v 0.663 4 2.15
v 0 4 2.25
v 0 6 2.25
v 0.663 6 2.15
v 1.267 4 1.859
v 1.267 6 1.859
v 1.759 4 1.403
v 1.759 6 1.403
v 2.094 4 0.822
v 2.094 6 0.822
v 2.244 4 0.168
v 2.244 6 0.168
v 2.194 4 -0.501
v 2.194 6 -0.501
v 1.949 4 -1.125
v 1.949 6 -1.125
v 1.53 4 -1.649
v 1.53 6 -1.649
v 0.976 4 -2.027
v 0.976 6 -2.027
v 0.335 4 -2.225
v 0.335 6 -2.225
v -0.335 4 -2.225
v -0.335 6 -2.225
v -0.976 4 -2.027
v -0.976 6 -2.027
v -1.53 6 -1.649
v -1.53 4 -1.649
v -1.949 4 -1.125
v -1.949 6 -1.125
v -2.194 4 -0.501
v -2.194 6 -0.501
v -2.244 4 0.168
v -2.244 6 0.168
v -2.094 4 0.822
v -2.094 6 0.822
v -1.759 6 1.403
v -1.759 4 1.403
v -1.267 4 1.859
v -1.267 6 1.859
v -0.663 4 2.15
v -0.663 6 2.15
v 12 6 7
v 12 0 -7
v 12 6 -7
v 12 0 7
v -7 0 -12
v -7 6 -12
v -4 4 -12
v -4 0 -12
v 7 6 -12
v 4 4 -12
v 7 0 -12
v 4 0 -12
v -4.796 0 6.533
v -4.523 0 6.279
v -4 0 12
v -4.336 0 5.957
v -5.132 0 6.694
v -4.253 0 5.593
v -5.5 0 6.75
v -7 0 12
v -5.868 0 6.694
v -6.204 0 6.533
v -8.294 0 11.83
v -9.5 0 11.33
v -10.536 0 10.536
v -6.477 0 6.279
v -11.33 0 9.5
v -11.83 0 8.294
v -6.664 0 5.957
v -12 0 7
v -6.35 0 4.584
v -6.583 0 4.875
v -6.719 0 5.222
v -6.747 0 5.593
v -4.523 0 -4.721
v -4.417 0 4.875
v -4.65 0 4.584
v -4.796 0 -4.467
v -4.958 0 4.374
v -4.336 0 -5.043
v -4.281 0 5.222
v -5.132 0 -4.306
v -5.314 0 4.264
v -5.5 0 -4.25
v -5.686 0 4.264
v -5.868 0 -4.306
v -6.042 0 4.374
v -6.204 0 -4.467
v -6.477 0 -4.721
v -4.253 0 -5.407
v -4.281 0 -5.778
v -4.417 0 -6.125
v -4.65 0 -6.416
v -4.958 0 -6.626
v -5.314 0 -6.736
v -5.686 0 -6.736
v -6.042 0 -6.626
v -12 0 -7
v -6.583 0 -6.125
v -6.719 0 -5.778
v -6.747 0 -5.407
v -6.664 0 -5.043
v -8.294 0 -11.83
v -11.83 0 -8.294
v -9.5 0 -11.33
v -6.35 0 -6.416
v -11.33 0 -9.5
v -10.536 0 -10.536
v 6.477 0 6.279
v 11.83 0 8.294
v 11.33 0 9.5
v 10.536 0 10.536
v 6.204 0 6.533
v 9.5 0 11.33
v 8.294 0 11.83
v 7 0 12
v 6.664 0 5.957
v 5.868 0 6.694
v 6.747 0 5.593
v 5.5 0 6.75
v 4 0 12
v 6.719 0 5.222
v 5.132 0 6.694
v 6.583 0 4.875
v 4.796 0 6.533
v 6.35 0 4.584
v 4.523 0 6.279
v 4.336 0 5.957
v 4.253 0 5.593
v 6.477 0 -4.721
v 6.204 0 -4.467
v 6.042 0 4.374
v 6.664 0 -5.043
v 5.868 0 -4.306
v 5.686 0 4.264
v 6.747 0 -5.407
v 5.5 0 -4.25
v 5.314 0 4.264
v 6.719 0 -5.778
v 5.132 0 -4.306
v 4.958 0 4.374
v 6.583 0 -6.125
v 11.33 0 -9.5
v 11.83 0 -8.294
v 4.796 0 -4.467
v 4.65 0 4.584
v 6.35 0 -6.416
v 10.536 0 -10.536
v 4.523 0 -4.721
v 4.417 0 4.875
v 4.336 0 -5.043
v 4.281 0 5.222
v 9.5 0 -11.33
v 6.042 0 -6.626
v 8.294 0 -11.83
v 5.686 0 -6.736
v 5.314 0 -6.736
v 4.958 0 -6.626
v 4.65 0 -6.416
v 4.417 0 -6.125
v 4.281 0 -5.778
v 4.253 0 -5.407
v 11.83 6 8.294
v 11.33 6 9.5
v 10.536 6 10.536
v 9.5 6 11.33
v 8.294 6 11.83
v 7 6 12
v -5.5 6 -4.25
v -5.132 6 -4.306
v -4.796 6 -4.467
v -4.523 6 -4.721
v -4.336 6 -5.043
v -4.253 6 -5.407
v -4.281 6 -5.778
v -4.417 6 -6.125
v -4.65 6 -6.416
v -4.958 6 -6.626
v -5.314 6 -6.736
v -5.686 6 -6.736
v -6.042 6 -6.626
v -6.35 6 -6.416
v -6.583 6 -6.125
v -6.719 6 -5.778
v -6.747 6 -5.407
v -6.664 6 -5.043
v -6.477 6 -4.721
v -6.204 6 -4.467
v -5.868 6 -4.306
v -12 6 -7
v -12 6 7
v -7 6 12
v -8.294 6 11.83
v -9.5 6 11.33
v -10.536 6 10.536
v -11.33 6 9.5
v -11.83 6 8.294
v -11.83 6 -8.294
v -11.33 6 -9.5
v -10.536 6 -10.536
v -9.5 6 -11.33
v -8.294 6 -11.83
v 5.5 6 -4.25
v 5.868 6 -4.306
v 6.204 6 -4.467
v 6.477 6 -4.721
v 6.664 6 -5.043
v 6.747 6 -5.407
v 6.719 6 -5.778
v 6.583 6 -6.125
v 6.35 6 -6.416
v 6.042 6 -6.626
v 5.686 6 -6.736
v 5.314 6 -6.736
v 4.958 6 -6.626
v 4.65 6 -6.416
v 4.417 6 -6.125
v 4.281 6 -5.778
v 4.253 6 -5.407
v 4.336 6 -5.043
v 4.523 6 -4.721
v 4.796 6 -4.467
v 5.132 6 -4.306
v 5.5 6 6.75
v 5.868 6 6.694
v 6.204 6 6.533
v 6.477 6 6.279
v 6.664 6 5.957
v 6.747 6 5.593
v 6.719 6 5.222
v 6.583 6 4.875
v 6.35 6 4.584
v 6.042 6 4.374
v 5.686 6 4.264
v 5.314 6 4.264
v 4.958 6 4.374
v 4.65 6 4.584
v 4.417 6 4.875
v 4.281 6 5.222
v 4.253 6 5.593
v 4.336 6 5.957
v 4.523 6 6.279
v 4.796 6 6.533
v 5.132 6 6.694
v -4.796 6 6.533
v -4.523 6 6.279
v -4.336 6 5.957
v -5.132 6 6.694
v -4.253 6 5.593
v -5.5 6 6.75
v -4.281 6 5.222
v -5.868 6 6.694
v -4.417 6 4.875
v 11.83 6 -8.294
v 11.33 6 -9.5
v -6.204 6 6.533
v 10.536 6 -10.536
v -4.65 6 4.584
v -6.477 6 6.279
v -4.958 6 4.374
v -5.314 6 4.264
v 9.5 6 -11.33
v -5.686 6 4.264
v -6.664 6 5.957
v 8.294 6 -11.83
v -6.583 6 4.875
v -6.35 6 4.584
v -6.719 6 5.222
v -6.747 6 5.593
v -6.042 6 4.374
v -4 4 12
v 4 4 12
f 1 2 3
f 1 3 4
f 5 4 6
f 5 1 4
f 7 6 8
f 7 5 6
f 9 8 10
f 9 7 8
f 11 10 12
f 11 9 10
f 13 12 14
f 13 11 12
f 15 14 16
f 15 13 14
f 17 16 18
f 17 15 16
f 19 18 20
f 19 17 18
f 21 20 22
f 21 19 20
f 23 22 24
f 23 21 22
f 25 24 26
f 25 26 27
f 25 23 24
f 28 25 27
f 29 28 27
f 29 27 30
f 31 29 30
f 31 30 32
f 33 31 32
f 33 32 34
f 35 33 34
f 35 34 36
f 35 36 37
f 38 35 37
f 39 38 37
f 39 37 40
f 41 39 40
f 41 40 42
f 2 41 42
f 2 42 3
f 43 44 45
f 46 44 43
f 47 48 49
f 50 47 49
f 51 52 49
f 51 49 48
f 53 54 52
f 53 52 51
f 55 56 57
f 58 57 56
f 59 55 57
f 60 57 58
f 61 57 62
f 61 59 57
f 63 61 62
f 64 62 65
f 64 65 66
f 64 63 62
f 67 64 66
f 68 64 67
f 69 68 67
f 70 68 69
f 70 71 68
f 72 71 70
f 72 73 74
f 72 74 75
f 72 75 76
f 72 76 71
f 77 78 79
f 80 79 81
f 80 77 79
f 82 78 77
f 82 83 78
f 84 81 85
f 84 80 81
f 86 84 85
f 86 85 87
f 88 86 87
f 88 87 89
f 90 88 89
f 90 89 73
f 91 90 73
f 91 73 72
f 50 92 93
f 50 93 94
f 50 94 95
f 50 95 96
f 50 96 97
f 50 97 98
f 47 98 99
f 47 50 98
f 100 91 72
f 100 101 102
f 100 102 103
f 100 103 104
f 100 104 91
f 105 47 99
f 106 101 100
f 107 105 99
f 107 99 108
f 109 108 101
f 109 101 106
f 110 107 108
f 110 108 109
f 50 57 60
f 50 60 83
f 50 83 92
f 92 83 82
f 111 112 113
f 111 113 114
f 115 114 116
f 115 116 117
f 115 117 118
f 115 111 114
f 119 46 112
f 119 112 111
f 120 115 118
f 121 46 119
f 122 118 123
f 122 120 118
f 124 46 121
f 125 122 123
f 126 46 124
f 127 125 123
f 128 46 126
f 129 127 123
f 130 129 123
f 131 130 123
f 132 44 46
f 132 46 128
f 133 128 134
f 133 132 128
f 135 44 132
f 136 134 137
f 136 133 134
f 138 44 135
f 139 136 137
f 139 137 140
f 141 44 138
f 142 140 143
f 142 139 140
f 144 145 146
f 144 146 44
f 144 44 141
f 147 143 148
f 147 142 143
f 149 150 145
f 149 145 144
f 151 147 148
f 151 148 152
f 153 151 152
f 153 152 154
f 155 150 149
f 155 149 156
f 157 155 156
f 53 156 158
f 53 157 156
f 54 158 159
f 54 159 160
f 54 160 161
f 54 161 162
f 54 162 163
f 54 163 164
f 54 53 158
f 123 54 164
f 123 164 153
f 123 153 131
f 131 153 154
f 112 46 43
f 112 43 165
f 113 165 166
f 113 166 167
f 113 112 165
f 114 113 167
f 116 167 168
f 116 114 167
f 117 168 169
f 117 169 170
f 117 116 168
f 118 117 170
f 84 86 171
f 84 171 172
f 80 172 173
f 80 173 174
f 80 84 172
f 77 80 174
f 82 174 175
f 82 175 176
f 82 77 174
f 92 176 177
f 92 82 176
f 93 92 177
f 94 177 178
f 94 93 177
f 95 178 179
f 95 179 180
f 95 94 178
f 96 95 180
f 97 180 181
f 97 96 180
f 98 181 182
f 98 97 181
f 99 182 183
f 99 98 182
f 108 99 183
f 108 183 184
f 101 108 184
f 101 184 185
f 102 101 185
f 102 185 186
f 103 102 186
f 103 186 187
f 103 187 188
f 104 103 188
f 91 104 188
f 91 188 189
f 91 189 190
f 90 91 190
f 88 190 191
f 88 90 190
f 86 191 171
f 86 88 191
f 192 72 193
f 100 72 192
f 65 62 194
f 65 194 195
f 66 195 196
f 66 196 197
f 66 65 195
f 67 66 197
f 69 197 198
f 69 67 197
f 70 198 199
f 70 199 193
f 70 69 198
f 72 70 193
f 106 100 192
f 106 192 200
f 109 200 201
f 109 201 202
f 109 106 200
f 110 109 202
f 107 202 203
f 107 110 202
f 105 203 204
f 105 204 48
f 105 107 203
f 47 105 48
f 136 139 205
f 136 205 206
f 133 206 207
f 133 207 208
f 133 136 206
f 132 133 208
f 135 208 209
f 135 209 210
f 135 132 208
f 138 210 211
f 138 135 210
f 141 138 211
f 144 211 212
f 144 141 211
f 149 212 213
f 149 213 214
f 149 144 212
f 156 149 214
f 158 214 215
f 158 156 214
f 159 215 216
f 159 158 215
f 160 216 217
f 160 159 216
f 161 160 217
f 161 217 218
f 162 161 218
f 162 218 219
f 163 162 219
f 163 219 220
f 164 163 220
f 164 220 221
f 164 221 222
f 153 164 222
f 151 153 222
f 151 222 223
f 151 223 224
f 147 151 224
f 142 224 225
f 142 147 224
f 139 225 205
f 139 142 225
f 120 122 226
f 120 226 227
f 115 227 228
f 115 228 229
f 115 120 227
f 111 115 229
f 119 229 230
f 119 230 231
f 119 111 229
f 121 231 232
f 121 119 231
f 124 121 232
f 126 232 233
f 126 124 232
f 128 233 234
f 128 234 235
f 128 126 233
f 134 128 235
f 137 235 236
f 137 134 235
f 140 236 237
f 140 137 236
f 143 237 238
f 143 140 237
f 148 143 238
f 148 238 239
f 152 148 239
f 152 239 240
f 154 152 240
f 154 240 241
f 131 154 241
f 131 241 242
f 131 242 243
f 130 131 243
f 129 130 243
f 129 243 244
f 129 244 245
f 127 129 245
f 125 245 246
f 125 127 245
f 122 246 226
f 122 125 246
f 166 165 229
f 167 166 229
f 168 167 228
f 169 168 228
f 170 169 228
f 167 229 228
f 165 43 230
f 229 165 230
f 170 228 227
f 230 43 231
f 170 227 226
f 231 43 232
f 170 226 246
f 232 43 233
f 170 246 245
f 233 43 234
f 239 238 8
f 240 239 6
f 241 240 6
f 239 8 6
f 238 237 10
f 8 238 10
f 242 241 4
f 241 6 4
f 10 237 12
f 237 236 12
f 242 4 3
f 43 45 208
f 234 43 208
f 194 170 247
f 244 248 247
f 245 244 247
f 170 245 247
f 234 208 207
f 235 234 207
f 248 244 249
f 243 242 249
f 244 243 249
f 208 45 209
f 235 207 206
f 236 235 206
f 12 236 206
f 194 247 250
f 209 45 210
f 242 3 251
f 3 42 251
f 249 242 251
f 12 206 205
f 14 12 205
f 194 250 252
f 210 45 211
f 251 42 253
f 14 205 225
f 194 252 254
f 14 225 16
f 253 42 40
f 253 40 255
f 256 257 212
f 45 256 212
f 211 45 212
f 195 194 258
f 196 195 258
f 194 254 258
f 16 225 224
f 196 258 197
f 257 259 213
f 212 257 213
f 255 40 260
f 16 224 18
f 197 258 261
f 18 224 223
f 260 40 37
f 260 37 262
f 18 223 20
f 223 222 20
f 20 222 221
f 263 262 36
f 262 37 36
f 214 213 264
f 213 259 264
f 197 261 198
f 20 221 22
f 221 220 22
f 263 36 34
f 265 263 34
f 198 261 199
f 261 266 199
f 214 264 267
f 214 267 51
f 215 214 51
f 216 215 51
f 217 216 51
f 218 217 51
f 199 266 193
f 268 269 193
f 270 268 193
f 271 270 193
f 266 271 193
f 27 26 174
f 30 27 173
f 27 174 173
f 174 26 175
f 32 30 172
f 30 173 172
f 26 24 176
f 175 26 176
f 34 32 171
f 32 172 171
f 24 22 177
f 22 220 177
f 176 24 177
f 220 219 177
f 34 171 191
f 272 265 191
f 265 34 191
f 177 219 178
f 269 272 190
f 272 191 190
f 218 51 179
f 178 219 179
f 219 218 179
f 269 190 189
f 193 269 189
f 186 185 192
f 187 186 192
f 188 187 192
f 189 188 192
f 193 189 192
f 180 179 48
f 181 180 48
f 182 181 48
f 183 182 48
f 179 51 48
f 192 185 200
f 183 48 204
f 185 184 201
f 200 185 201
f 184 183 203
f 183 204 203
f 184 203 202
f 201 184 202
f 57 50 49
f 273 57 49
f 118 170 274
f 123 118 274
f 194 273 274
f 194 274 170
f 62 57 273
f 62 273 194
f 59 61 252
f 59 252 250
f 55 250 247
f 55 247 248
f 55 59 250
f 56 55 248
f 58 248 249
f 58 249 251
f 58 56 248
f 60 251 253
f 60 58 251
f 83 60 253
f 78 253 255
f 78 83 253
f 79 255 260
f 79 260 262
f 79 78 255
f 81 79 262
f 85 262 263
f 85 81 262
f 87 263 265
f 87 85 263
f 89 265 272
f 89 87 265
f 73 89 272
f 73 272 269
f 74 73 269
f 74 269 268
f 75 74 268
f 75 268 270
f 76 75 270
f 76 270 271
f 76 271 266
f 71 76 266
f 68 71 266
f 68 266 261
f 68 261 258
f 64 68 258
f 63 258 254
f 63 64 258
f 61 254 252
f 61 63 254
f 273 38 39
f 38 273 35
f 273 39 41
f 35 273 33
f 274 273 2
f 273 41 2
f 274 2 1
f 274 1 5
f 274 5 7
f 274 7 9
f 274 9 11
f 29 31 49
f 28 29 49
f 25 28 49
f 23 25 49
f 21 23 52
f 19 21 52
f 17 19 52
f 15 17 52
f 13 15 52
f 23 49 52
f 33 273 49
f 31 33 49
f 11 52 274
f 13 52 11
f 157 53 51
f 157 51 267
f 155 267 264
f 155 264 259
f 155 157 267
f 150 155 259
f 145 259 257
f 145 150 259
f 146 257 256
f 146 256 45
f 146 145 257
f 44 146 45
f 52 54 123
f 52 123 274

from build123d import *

# Parameters (mm, degrees)
SKETCH1_R               = 1.25
SKETCH1_R_2             = 2.25
BOSS_EXTRUDE1_DEPTH     = 6
CUT_EXTRUDE1_DEPTH      = 28.49545417
CUT_EXTRUDE1_DEPTH_BACK = 28.49545417
SKETCH2_W               = 8
SKETCH2_H               = 4


with BuildPart() as part:
    # Sketch1 → Boss-Extrude1 (new body)
    with BuildSketch(Plane(origin=(0, 0, 0), x_dir=(1, 0, 0), z_dir=(0, 1, 0))):
        with BuildLine():
            Line((-7, 12), (7, 12))
            ThreePointArc((7, 12), (10.535533906, 10.535533906), (12, 7))
            Line((12, 7), (12, -7))
            ThreePointArc((12, -7), (10.535533906, -10.535533906), (7, -12))
            Line((7, -12), (-7, -12))
            ThreePointArc((-7, -12), (-10.535533906, -10.535533906), (-12, -7))
            Line((-12, -7), (-12, 7))
            ThreePointArc((-12, 7), (-10.535533906, 10.535533906), (-7, 12))
        make_face()
        with Locations(Location((-5.5, 5.5, 0), (0, 0, 270))):
            Circle(SKETCH1_R, mode=Mode.SUBTRACT)
        with Locations(Location((5.5, 5.5, 0), (0, 0, 270))):
            Circle(SKETCH1_R, mode=Mode.SUBTRACT)
        with Locations(Location((5.5, -5.5, 0), (0, 0, 270))):
            Circle(SKETCH1_R, mode=Mode.SUBTRACT)
        with Locations(Location((-5.5, -5.5, 0), (0, 0, 270))):
            Circle(SKETCH1_R, mode=Mode.SUBTRACT)
        with Locations(Location((0, 0, 0), (0, 0, 270))):
            Circle(SKETCH1_R_2, mode=Mode.SUBTRACT)
    extrude(amount=BOSS_EXTRUDE1_DEPTH)

    # Sketch2 → Cut-Extrude1 (cut, two sides: drawn at the far end of the back side and taken through both)
    with BuildSketch(Plane.XY.offset(12).offset(-CUT_EXTRUDE1_DEPTH_BACK)):
        with Locations((0, 2)):
            Rectangle(SKETCH2_W, SKETCH2_H)
    extrude(amount=CUT_EXTRUDE1_DEPTH + CUT_EXTRUDE1_DEPTH_BACK, mode=Mode.SUBTRACT)


solid = part.part
